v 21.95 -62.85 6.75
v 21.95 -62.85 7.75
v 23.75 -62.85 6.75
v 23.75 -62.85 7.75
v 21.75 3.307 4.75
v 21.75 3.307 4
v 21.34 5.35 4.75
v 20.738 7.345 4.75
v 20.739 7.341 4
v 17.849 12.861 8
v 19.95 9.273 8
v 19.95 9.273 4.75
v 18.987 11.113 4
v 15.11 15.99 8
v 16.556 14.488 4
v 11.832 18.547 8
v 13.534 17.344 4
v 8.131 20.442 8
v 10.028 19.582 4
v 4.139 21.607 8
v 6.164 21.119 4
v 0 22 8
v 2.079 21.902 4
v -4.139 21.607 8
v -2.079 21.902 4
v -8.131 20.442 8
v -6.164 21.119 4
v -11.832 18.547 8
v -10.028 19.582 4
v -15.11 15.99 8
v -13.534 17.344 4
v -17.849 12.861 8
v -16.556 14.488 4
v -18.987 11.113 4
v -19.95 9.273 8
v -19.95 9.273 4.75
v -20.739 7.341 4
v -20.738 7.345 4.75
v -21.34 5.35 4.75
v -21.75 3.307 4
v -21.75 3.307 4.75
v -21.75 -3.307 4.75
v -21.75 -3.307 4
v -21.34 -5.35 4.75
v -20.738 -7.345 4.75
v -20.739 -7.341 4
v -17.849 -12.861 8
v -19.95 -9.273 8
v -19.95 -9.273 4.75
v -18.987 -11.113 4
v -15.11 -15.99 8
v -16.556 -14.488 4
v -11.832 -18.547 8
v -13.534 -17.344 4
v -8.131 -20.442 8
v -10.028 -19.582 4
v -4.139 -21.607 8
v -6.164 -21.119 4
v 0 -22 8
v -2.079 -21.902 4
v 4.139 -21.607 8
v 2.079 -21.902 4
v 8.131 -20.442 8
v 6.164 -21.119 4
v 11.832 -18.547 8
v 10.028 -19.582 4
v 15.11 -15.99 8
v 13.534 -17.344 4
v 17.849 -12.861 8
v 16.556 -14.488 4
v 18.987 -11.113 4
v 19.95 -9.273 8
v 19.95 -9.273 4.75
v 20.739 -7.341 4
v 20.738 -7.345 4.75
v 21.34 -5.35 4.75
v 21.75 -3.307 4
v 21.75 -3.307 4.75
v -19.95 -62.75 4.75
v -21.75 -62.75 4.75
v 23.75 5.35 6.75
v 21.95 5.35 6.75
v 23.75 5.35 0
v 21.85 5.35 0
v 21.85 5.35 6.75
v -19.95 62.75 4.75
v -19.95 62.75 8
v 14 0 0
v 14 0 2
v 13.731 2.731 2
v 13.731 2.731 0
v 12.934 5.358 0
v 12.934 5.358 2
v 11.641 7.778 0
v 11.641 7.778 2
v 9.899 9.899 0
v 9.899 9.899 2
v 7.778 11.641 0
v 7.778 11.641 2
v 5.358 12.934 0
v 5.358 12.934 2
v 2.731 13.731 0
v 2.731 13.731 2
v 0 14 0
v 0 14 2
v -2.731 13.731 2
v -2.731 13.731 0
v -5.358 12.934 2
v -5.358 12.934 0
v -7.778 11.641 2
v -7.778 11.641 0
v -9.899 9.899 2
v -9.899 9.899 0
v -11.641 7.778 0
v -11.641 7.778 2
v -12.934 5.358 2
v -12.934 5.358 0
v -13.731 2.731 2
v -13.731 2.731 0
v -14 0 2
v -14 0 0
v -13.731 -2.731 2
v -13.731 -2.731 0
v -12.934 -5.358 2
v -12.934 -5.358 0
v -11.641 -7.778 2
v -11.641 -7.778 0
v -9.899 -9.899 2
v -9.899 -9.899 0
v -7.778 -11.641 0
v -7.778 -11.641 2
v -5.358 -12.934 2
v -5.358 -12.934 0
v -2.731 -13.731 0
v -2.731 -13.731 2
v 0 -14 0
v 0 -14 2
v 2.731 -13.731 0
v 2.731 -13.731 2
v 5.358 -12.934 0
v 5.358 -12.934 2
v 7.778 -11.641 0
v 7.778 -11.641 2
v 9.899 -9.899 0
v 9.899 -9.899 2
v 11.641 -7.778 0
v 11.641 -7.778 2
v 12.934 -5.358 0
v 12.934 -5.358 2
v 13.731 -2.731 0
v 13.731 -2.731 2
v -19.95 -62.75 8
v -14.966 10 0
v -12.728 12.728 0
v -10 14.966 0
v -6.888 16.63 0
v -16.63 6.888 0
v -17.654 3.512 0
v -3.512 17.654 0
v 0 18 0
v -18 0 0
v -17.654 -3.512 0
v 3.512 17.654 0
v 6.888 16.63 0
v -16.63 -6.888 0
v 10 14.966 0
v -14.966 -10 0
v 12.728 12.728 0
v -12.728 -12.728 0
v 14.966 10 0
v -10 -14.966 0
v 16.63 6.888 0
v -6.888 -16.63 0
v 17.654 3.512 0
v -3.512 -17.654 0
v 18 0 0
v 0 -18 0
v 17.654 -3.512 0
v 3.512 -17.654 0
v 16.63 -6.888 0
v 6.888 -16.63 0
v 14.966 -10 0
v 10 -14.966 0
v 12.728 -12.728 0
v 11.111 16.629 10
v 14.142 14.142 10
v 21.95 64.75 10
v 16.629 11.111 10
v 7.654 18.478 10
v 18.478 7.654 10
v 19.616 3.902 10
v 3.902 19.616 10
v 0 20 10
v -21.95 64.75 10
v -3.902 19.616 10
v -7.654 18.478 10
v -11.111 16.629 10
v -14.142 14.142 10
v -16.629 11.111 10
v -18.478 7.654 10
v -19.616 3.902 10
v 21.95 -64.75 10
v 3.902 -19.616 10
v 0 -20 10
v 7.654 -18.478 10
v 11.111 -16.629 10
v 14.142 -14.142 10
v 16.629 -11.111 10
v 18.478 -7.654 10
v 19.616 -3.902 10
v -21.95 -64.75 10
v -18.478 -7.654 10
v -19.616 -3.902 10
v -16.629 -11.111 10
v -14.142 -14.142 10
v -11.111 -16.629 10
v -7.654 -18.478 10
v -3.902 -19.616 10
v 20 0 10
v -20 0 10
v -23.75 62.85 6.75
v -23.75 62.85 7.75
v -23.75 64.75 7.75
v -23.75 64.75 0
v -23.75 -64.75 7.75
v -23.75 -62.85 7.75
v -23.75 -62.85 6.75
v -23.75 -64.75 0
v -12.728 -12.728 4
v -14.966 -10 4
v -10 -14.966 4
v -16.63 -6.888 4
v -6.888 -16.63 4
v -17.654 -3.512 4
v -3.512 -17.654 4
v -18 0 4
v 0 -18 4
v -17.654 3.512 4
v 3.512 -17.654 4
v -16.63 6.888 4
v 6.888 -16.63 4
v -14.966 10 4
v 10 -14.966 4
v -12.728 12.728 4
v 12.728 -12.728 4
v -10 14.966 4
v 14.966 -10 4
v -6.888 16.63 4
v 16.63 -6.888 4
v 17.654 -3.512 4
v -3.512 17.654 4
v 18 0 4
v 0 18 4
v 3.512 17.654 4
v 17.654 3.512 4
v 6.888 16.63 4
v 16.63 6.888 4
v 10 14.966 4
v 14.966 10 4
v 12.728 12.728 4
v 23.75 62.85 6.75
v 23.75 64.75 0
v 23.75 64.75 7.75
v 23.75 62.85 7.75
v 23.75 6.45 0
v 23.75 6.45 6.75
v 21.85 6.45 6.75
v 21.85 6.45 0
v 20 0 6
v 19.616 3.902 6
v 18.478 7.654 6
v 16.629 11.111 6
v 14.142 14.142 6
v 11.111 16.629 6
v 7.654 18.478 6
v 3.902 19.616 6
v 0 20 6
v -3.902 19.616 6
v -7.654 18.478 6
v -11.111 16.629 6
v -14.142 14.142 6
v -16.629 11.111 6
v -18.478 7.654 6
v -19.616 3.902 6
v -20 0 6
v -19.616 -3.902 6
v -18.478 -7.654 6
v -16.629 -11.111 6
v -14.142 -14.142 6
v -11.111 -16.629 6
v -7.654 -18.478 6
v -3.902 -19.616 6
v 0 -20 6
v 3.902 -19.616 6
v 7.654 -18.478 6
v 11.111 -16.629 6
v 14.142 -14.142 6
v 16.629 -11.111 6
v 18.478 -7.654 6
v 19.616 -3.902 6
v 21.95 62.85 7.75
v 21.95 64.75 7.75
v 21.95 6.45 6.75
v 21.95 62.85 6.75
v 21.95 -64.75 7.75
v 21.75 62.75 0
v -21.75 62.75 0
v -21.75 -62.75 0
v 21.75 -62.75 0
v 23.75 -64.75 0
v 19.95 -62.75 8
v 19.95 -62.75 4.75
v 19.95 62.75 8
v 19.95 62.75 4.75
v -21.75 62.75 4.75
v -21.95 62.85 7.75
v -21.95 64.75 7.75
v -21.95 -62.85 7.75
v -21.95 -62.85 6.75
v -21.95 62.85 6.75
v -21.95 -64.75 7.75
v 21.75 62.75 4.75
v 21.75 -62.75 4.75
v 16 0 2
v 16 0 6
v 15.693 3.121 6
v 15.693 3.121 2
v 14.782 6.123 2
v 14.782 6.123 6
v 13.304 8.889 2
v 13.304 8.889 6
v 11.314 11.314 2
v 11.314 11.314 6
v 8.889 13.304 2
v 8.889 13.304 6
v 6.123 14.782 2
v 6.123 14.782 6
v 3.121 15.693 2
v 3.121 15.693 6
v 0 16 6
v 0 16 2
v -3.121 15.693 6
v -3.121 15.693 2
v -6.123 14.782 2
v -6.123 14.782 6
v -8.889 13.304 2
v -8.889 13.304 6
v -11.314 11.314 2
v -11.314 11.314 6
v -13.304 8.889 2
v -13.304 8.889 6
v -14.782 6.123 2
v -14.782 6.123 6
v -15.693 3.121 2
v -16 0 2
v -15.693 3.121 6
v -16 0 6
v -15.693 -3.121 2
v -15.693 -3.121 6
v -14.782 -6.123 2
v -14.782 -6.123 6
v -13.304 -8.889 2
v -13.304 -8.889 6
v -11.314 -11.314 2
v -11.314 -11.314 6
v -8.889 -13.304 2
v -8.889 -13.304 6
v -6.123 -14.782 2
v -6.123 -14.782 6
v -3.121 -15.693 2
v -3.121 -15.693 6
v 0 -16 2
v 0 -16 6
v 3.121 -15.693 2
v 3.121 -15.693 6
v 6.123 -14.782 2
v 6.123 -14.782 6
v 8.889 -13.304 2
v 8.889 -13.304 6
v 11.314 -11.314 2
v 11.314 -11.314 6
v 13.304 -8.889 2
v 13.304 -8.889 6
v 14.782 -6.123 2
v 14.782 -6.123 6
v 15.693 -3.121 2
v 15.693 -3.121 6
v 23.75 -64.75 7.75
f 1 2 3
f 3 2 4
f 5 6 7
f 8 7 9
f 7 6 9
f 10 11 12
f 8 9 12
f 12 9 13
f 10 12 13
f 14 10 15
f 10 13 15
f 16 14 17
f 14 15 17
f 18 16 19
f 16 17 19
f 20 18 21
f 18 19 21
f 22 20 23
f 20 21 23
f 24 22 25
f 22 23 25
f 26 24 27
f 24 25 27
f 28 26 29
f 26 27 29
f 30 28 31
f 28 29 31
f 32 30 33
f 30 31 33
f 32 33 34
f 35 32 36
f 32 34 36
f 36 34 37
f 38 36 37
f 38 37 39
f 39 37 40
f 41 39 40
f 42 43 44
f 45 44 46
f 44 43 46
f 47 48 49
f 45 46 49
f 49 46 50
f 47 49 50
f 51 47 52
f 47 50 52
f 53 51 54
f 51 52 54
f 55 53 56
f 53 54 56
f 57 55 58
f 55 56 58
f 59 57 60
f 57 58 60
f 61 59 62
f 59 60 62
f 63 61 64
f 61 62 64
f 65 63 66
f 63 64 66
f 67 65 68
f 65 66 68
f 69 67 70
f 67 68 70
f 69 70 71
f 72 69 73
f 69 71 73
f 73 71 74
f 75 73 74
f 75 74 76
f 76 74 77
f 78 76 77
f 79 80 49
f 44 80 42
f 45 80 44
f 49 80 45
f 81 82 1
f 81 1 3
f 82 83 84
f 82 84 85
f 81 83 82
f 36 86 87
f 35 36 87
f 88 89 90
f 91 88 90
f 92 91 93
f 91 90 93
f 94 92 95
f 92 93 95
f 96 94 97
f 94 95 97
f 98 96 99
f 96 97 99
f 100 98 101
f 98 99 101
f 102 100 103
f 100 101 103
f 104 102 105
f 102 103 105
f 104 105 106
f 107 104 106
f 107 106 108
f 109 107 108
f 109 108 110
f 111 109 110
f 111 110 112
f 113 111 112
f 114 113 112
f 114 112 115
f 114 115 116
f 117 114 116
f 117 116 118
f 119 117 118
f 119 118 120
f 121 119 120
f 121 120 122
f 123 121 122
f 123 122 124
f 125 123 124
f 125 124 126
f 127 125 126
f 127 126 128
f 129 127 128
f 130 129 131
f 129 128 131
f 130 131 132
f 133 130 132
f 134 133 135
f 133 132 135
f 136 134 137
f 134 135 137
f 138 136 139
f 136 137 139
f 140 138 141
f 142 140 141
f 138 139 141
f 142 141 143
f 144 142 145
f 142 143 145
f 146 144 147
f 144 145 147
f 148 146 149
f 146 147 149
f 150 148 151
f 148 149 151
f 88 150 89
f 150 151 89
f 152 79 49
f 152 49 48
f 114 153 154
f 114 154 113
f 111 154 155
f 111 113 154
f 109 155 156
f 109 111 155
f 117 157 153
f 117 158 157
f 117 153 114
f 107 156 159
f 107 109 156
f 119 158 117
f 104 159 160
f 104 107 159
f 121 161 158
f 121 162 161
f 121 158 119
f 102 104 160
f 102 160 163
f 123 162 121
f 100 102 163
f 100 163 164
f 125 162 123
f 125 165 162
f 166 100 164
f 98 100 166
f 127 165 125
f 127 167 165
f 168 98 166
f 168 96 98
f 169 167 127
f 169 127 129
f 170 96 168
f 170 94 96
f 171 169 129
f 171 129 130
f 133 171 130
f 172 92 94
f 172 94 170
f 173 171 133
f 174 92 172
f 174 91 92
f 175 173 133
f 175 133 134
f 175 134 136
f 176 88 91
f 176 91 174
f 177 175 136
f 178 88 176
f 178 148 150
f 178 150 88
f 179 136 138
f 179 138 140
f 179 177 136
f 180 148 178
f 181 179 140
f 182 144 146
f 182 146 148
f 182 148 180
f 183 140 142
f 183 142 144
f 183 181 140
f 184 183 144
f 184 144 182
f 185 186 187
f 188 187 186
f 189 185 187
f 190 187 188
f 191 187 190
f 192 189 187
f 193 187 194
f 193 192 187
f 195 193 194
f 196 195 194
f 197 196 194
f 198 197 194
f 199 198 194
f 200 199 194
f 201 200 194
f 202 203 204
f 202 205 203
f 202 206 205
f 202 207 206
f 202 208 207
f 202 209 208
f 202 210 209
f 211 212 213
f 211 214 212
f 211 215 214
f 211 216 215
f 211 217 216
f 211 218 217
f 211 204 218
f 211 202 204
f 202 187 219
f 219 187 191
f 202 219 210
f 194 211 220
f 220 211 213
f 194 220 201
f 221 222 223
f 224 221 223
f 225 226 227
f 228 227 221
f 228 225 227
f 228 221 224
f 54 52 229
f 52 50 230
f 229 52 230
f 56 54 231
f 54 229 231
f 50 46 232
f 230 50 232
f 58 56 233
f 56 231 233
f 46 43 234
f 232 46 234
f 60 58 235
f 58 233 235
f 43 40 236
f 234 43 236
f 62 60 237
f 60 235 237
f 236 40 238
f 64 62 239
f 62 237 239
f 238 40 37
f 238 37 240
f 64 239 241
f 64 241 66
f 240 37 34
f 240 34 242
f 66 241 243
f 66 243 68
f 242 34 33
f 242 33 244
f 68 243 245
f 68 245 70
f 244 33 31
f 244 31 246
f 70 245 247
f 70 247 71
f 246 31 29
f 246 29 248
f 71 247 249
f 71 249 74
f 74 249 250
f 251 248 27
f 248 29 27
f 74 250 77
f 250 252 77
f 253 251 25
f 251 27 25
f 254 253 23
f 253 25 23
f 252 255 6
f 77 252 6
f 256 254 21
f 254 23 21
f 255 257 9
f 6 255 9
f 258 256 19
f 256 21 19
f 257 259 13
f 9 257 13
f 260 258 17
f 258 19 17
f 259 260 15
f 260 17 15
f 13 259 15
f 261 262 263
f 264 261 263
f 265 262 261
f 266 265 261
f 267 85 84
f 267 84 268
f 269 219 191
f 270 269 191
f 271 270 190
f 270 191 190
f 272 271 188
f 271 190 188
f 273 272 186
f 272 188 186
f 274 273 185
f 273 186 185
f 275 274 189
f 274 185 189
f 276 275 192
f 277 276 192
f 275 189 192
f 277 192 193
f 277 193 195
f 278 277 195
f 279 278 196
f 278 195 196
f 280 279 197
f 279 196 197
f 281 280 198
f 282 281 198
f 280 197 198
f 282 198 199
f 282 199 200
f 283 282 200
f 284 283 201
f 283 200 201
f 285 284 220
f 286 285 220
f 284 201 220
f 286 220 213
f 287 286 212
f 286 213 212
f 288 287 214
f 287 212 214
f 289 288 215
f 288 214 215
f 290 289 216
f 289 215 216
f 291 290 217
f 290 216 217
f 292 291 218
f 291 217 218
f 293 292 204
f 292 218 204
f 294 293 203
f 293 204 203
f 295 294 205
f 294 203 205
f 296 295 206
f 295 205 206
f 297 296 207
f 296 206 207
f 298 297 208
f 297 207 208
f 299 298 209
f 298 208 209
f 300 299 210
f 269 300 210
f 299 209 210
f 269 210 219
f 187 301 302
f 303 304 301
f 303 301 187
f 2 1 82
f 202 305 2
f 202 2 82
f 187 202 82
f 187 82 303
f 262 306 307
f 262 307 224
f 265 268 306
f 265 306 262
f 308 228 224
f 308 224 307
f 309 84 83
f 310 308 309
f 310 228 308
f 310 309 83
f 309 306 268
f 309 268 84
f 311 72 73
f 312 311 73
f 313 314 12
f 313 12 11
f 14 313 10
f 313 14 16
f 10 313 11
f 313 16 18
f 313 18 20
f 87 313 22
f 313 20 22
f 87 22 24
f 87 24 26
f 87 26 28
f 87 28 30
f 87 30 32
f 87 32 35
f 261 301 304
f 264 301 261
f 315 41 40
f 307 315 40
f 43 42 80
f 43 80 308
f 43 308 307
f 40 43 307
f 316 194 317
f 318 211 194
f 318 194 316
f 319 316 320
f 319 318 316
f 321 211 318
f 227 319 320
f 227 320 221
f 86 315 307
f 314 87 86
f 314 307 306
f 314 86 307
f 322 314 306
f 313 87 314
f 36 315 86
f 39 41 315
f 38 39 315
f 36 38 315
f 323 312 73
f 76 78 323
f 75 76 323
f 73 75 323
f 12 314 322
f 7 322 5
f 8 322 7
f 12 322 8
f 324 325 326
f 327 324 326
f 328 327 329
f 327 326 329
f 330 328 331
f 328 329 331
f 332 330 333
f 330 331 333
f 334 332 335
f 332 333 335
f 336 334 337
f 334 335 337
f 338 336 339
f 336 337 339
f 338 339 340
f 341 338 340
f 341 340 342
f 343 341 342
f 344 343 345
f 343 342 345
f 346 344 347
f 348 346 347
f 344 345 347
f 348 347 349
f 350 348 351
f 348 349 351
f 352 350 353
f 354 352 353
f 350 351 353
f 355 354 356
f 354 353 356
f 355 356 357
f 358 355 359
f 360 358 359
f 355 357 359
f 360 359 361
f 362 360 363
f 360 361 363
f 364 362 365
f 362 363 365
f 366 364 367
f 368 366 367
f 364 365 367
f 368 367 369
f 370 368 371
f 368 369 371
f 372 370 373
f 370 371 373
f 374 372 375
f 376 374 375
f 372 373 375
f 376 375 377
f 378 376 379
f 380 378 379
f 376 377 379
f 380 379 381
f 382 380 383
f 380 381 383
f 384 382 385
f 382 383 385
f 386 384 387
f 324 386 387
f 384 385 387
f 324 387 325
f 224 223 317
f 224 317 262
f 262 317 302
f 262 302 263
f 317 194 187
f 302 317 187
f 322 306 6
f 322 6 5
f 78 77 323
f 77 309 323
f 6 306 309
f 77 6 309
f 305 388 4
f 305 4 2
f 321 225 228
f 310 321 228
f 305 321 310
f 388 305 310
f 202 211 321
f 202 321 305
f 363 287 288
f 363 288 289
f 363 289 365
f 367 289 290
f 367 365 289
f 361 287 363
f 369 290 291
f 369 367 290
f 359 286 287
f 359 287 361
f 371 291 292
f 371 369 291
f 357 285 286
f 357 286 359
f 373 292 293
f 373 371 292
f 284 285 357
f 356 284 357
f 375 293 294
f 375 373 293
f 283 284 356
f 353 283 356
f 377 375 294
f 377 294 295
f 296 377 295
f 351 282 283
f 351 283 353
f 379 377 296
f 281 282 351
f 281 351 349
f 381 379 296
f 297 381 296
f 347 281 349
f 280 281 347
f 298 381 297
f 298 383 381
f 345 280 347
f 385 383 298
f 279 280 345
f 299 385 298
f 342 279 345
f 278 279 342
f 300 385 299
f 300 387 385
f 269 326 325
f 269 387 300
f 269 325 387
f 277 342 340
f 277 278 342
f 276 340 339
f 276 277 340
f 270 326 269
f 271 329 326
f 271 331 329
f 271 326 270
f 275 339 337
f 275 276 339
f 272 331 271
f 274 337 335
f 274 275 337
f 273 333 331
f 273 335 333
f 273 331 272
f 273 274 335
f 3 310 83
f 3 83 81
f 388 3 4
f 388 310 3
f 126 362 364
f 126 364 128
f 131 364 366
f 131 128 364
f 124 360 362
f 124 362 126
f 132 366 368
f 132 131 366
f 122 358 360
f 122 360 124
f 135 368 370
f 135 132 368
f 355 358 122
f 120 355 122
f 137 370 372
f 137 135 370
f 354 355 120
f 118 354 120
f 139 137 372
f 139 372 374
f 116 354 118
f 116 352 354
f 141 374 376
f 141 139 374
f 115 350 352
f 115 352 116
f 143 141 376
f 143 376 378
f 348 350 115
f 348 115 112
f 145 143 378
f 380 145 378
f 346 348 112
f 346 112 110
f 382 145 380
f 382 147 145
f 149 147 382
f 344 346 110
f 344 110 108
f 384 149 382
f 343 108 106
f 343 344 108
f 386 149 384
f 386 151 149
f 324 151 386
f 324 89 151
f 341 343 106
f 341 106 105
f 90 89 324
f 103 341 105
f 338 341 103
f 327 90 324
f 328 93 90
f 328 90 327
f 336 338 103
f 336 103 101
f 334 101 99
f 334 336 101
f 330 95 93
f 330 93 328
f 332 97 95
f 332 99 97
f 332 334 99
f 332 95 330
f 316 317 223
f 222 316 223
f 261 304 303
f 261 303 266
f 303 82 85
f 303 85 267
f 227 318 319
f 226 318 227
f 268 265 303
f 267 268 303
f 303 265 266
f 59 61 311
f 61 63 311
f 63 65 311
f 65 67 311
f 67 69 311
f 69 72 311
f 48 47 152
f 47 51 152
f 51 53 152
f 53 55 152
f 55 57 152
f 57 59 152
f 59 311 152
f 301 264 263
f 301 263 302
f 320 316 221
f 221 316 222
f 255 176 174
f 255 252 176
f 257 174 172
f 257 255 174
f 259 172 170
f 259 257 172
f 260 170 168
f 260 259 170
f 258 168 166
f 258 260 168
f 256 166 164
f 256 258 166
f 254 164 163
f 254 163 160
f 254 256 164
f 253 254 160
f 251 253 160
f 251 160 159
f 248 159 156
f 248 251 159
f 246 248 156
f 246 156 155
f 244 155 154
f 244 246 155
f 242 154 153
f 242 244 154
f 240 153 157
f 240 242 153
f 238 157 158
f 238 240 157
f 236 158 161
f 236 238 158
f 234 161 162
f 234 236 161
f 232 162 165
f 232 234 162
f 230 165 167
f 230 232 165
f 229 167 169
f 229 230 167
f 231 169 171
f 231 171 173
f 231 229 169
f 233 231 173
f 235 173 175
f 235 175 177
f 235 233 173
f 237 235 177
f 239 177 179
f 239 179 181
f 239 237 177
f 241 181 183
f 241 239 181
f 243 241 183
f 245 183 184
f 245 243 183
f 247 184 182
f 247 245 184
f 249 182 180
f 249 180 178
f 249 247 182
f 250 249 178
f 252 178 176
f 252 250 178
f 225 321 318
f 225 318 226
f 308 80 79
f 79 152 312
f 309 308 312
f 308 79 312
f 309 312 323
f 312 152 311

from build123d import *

# Parameters (mm, degrees)
F1_DEPTH      = 64.75
F2_W          = 1.8
F2_H          = 125.7
F3_DEPTH      = 1
F4_R          = 20
F5_DEPTH      = 4
F6_R          = 16
F7_DEPTH      = 4
F8_R          = 14
F9_DEPTH      = 2.001
F10_T         = 2
F10_T3_DEPTH  = 5.9
F10_T5_DEPTH  = 5
F10_T7_DEPTH  = 5.8
F10_T9_DEPTH  = 129.7
F10_T11_DEPTH = 5.9
F10_T13_DEPTH = 5.8
F11_W         = 1.1
F11_H         = 6.75
F12_DEPTH     = 1.9


# Not quite as in the source:
# - a pattern or mirror of a feature is missing from the dataset's text; its kind, count and spacing are read off the source's solid
# - a shell that OpenCascade refuses in one call is made with other operations: the cavity is built on its own and cut out


with BuildPart() as f1:
    # F0 (on Front) → F1 (new body, symmetric)
    with BuildSketch(Plane.XZ):
        Polygon((-23.75, 7.75), (-23.75, 0), (23.75, 0), (23.75, 7.75), (21.95, 7.75), (21.95, 10), (-21.95, 10), (-21.95, 7.75), align=None)
    extrude(amount=F1_DEPTH, both=True)

    # F2 (on face) → F3 (cut)
    with BuildSketch(Plane.XY.offset(7.75)):
        with Locations((22.85, 0)):
            Rectangle(F2_W, F2_H)
    f3 = extrude(amount=-F3_DEPTH, mode=Mode.SUBTRACT)

    # F3_copies: F3 across plane
    add(f3.mirror(Plane(origin=(0, 0, 0), x_dir=(0, 0, -1), z_dir=(-1, 0, 0))), mode=Mode.SUBTRACT)

    # F4 (on face) → F5 (cut)
    with BuildSketch(Plane.XY.offset(10)):
        Circle(F4_R)
    extrude(amount=-F5_DEPTH, mode=Mode.SUBTRACT)

    # F6 (on face) → F7 (cut)
    with BuildSketch(Plane.XY.offset(6)):
        Circle(F6_R)
    extrude(amount=-F7_DEPTH, mode=Mode.SUBTRACT)

    # F8 (on face) → F9 (cut, through all)
    with BuildSketch(Plane.XY.offset(2)):
        Circle(F8_R)
    extrude(amount=-F9_DEPTH, mode=Mode.SUBTRACT)

    # F10: shell of thickness 2, made by hand


with BuildPart() as f10_core1:
    # F10_t2: copy of F1
    add(f1.part)

    # the walls: a layer under each face that stays
    f10_faces = [f10_core1.faces().sort_by_distance(p)[0] for p in [
        (-23.75, 0, 3.875),
        (-22.85, 63.8, 7.75),
        (-22.85, 62.85, 7.25),
        (-22.85, 0, 6.75),
        (-22.85, -62.85, 7.25),
        (-22.85, -63.8, 7.75),
        (0, -64.75, 5),
        (0, 64.75, 5),
        (-21.95, 0, 8.375),
        (23.75, 0, 3.875),
        (22.85, -63.8, 7.75),
        (21.95, 0, 8.375),
        (14.6333333333, 43.1666666667, 10),
        (-14, 0, 1),
        (22.85, 63.8, 7.75),
        (22.85, -62.85, 7.25),
        (22.85, 0, 6.75),
        (22.85, 62.85, 7.25),
        (-20, 0, 8),
        (-10.6666666667, -10.6666666667, 2),
        (-13.3333333333, -13.3333333333, 6),
        (-16, 0, 4),
    ]]
    thicken(f10_faces, amount=-F10_T, mode=Mode.SUBTRACT)

    # F10_s4 → F10_t3 (cut)
    with BuildSketch(Plane.XZ.offset(-66.75)):
        Polygon((-21.97, 7.77), (-21.95, 5.75), (-19.95, 5.75), (-19.95, 7.75), align=None)
        Polygon((21.97, 7.77), (19.95, 7.75), (19.95, 5.75), (21.95, 5.75), align=None)
    extrude(amount=F10_T3_DEPTH, mode=Mode.SUBTRACT)

    # F10_s6 → F10_t5 (cut)
    with BuildSketch(Plane.XY.offset(4.75)):
        Polygon((-21.97, 62.83), (-21.95, 64.85), (-19.95, 64.85), (-19.95, 62.85), align=None)
        Polygon((-21.97, -62.83), (-21.95, -64.85), (-19.95, -64.85), (-19.95, -62.85), align=None)
        Polygon((21.97, -62.83), (19.95, -62.85), (19.95, -64.85), (21.95, -64.85), align=None)
        Polygon((21.97, 62.83), (19.95, 62.85), (19.95, 64.85), (21.95, 64.85), align=None)
    extrude(amount=F10_T5_DEPTH, mode=Mode.SUBTRACT)

    # F10_s8 → F10_t7 (cut)
    with BuildSketch(Plane.YZ.offset(-25.75)):
        Polygon((62.83, 6.77), (64.85, 6.75), (64.85, 4.75), (62.85, 4.75), align=None)
        Polygon((-62.83, 6.77), (-62.85, 4.75), (-64.85, 4.75), (-64.85, 6.75), align=None)
    extrude(amount=F10_T7_DEPTH, mode=Mode.SUBTRACT)

    # F10_s10 → F10_t9 (cut)
    with BuildSketch(Plane.XZ.offset(-64.85)):
        Polygon((-21.97, 6.77), (-21.95, 4.75), (-19.95, 4.75), (-19.95, 6.75), align=None)
        Polygon((21.97, 6.77), (19.95, 6.75), (19.95, 4.75), (21.95, 4.75), align=None)
    extrude(amount=F10_T9_DEPTH, mode=Mode.SUBTRACT)

    # F10_s12 → F10_t11 (cut)
    with BuildSketch(Plane.XZ.offset(60.85)):
        Polygon((-21.97, 7.77), (-21.95, 5.75), (-19.95, 5.75), (-19.95, 7.75), align=None)
        Polygon((21.97, 7.77), (21.95, 5.75), (19.95, 5.75), (19.95, 7.75), align=None)
    extrude(amount=F10_T11_DEPTH, mode=Mode.SUBTRACT)

    # F10_s14 → F10_t13 (cut)
    with BuildSketch(Plane.YZ.offset(19.95)):
        Polygon((-62.83, 6.77), (-64.85, 6.75), (-64.85, 4.75), (-62.85, 4.75), align=None)
        Polygon((62.83, 6.77), (62.85, 4.75), (64.85, 4.75), (64.85, 6.75), align=None)
    extrude(amount=F10_T13_DEPTH, mode=Mode.SUBTRACT)

    # F10_s15 → F10_t16 (revolve, cut)
    with BuildSketch(Plane.XZ):
        Polygon((19.98, 6.02), (22, 6), (22, 4), (20, 4), align=None)
    revolve(axis=Axis((0, 0, 6), (0, 0, 1)), mode=Mode.SUBTRACT)

    # F10_s17 → F10_t18 (revolve, cut)
    with BuildSketch(Plane.XZ):
        Polygon((15.98, 2.02), (16, 0), (18, 0), (18, 2), align=None)
    revolve(axis=Axis((0, 0, 2), (0, 0, 1)), mode=Mode.SUBTRACT)


with BuildPart() as f1_1:
    add(f1.part)

    # what is left inside the walls is the cavity
    f10_cavity = [f10_core1.part.solids().sort_by_distance(p)[0] for p in [
        (0, 20.916667, 0.02),
    ]]
    add(f10_cavity, mode=Mode.SUBTRACT)

    # F11 (on face) → F12 (cut)
    with BuildSketch(Plane.YZ.offset(23.75)):
        with Locations((5.9, 3.375)):
            Rectangle(F11_W, F11_H)
    extrude(amount=-F12_DEPTH, mode=Mode.SUBTRACT)


solid = f1_1.part
